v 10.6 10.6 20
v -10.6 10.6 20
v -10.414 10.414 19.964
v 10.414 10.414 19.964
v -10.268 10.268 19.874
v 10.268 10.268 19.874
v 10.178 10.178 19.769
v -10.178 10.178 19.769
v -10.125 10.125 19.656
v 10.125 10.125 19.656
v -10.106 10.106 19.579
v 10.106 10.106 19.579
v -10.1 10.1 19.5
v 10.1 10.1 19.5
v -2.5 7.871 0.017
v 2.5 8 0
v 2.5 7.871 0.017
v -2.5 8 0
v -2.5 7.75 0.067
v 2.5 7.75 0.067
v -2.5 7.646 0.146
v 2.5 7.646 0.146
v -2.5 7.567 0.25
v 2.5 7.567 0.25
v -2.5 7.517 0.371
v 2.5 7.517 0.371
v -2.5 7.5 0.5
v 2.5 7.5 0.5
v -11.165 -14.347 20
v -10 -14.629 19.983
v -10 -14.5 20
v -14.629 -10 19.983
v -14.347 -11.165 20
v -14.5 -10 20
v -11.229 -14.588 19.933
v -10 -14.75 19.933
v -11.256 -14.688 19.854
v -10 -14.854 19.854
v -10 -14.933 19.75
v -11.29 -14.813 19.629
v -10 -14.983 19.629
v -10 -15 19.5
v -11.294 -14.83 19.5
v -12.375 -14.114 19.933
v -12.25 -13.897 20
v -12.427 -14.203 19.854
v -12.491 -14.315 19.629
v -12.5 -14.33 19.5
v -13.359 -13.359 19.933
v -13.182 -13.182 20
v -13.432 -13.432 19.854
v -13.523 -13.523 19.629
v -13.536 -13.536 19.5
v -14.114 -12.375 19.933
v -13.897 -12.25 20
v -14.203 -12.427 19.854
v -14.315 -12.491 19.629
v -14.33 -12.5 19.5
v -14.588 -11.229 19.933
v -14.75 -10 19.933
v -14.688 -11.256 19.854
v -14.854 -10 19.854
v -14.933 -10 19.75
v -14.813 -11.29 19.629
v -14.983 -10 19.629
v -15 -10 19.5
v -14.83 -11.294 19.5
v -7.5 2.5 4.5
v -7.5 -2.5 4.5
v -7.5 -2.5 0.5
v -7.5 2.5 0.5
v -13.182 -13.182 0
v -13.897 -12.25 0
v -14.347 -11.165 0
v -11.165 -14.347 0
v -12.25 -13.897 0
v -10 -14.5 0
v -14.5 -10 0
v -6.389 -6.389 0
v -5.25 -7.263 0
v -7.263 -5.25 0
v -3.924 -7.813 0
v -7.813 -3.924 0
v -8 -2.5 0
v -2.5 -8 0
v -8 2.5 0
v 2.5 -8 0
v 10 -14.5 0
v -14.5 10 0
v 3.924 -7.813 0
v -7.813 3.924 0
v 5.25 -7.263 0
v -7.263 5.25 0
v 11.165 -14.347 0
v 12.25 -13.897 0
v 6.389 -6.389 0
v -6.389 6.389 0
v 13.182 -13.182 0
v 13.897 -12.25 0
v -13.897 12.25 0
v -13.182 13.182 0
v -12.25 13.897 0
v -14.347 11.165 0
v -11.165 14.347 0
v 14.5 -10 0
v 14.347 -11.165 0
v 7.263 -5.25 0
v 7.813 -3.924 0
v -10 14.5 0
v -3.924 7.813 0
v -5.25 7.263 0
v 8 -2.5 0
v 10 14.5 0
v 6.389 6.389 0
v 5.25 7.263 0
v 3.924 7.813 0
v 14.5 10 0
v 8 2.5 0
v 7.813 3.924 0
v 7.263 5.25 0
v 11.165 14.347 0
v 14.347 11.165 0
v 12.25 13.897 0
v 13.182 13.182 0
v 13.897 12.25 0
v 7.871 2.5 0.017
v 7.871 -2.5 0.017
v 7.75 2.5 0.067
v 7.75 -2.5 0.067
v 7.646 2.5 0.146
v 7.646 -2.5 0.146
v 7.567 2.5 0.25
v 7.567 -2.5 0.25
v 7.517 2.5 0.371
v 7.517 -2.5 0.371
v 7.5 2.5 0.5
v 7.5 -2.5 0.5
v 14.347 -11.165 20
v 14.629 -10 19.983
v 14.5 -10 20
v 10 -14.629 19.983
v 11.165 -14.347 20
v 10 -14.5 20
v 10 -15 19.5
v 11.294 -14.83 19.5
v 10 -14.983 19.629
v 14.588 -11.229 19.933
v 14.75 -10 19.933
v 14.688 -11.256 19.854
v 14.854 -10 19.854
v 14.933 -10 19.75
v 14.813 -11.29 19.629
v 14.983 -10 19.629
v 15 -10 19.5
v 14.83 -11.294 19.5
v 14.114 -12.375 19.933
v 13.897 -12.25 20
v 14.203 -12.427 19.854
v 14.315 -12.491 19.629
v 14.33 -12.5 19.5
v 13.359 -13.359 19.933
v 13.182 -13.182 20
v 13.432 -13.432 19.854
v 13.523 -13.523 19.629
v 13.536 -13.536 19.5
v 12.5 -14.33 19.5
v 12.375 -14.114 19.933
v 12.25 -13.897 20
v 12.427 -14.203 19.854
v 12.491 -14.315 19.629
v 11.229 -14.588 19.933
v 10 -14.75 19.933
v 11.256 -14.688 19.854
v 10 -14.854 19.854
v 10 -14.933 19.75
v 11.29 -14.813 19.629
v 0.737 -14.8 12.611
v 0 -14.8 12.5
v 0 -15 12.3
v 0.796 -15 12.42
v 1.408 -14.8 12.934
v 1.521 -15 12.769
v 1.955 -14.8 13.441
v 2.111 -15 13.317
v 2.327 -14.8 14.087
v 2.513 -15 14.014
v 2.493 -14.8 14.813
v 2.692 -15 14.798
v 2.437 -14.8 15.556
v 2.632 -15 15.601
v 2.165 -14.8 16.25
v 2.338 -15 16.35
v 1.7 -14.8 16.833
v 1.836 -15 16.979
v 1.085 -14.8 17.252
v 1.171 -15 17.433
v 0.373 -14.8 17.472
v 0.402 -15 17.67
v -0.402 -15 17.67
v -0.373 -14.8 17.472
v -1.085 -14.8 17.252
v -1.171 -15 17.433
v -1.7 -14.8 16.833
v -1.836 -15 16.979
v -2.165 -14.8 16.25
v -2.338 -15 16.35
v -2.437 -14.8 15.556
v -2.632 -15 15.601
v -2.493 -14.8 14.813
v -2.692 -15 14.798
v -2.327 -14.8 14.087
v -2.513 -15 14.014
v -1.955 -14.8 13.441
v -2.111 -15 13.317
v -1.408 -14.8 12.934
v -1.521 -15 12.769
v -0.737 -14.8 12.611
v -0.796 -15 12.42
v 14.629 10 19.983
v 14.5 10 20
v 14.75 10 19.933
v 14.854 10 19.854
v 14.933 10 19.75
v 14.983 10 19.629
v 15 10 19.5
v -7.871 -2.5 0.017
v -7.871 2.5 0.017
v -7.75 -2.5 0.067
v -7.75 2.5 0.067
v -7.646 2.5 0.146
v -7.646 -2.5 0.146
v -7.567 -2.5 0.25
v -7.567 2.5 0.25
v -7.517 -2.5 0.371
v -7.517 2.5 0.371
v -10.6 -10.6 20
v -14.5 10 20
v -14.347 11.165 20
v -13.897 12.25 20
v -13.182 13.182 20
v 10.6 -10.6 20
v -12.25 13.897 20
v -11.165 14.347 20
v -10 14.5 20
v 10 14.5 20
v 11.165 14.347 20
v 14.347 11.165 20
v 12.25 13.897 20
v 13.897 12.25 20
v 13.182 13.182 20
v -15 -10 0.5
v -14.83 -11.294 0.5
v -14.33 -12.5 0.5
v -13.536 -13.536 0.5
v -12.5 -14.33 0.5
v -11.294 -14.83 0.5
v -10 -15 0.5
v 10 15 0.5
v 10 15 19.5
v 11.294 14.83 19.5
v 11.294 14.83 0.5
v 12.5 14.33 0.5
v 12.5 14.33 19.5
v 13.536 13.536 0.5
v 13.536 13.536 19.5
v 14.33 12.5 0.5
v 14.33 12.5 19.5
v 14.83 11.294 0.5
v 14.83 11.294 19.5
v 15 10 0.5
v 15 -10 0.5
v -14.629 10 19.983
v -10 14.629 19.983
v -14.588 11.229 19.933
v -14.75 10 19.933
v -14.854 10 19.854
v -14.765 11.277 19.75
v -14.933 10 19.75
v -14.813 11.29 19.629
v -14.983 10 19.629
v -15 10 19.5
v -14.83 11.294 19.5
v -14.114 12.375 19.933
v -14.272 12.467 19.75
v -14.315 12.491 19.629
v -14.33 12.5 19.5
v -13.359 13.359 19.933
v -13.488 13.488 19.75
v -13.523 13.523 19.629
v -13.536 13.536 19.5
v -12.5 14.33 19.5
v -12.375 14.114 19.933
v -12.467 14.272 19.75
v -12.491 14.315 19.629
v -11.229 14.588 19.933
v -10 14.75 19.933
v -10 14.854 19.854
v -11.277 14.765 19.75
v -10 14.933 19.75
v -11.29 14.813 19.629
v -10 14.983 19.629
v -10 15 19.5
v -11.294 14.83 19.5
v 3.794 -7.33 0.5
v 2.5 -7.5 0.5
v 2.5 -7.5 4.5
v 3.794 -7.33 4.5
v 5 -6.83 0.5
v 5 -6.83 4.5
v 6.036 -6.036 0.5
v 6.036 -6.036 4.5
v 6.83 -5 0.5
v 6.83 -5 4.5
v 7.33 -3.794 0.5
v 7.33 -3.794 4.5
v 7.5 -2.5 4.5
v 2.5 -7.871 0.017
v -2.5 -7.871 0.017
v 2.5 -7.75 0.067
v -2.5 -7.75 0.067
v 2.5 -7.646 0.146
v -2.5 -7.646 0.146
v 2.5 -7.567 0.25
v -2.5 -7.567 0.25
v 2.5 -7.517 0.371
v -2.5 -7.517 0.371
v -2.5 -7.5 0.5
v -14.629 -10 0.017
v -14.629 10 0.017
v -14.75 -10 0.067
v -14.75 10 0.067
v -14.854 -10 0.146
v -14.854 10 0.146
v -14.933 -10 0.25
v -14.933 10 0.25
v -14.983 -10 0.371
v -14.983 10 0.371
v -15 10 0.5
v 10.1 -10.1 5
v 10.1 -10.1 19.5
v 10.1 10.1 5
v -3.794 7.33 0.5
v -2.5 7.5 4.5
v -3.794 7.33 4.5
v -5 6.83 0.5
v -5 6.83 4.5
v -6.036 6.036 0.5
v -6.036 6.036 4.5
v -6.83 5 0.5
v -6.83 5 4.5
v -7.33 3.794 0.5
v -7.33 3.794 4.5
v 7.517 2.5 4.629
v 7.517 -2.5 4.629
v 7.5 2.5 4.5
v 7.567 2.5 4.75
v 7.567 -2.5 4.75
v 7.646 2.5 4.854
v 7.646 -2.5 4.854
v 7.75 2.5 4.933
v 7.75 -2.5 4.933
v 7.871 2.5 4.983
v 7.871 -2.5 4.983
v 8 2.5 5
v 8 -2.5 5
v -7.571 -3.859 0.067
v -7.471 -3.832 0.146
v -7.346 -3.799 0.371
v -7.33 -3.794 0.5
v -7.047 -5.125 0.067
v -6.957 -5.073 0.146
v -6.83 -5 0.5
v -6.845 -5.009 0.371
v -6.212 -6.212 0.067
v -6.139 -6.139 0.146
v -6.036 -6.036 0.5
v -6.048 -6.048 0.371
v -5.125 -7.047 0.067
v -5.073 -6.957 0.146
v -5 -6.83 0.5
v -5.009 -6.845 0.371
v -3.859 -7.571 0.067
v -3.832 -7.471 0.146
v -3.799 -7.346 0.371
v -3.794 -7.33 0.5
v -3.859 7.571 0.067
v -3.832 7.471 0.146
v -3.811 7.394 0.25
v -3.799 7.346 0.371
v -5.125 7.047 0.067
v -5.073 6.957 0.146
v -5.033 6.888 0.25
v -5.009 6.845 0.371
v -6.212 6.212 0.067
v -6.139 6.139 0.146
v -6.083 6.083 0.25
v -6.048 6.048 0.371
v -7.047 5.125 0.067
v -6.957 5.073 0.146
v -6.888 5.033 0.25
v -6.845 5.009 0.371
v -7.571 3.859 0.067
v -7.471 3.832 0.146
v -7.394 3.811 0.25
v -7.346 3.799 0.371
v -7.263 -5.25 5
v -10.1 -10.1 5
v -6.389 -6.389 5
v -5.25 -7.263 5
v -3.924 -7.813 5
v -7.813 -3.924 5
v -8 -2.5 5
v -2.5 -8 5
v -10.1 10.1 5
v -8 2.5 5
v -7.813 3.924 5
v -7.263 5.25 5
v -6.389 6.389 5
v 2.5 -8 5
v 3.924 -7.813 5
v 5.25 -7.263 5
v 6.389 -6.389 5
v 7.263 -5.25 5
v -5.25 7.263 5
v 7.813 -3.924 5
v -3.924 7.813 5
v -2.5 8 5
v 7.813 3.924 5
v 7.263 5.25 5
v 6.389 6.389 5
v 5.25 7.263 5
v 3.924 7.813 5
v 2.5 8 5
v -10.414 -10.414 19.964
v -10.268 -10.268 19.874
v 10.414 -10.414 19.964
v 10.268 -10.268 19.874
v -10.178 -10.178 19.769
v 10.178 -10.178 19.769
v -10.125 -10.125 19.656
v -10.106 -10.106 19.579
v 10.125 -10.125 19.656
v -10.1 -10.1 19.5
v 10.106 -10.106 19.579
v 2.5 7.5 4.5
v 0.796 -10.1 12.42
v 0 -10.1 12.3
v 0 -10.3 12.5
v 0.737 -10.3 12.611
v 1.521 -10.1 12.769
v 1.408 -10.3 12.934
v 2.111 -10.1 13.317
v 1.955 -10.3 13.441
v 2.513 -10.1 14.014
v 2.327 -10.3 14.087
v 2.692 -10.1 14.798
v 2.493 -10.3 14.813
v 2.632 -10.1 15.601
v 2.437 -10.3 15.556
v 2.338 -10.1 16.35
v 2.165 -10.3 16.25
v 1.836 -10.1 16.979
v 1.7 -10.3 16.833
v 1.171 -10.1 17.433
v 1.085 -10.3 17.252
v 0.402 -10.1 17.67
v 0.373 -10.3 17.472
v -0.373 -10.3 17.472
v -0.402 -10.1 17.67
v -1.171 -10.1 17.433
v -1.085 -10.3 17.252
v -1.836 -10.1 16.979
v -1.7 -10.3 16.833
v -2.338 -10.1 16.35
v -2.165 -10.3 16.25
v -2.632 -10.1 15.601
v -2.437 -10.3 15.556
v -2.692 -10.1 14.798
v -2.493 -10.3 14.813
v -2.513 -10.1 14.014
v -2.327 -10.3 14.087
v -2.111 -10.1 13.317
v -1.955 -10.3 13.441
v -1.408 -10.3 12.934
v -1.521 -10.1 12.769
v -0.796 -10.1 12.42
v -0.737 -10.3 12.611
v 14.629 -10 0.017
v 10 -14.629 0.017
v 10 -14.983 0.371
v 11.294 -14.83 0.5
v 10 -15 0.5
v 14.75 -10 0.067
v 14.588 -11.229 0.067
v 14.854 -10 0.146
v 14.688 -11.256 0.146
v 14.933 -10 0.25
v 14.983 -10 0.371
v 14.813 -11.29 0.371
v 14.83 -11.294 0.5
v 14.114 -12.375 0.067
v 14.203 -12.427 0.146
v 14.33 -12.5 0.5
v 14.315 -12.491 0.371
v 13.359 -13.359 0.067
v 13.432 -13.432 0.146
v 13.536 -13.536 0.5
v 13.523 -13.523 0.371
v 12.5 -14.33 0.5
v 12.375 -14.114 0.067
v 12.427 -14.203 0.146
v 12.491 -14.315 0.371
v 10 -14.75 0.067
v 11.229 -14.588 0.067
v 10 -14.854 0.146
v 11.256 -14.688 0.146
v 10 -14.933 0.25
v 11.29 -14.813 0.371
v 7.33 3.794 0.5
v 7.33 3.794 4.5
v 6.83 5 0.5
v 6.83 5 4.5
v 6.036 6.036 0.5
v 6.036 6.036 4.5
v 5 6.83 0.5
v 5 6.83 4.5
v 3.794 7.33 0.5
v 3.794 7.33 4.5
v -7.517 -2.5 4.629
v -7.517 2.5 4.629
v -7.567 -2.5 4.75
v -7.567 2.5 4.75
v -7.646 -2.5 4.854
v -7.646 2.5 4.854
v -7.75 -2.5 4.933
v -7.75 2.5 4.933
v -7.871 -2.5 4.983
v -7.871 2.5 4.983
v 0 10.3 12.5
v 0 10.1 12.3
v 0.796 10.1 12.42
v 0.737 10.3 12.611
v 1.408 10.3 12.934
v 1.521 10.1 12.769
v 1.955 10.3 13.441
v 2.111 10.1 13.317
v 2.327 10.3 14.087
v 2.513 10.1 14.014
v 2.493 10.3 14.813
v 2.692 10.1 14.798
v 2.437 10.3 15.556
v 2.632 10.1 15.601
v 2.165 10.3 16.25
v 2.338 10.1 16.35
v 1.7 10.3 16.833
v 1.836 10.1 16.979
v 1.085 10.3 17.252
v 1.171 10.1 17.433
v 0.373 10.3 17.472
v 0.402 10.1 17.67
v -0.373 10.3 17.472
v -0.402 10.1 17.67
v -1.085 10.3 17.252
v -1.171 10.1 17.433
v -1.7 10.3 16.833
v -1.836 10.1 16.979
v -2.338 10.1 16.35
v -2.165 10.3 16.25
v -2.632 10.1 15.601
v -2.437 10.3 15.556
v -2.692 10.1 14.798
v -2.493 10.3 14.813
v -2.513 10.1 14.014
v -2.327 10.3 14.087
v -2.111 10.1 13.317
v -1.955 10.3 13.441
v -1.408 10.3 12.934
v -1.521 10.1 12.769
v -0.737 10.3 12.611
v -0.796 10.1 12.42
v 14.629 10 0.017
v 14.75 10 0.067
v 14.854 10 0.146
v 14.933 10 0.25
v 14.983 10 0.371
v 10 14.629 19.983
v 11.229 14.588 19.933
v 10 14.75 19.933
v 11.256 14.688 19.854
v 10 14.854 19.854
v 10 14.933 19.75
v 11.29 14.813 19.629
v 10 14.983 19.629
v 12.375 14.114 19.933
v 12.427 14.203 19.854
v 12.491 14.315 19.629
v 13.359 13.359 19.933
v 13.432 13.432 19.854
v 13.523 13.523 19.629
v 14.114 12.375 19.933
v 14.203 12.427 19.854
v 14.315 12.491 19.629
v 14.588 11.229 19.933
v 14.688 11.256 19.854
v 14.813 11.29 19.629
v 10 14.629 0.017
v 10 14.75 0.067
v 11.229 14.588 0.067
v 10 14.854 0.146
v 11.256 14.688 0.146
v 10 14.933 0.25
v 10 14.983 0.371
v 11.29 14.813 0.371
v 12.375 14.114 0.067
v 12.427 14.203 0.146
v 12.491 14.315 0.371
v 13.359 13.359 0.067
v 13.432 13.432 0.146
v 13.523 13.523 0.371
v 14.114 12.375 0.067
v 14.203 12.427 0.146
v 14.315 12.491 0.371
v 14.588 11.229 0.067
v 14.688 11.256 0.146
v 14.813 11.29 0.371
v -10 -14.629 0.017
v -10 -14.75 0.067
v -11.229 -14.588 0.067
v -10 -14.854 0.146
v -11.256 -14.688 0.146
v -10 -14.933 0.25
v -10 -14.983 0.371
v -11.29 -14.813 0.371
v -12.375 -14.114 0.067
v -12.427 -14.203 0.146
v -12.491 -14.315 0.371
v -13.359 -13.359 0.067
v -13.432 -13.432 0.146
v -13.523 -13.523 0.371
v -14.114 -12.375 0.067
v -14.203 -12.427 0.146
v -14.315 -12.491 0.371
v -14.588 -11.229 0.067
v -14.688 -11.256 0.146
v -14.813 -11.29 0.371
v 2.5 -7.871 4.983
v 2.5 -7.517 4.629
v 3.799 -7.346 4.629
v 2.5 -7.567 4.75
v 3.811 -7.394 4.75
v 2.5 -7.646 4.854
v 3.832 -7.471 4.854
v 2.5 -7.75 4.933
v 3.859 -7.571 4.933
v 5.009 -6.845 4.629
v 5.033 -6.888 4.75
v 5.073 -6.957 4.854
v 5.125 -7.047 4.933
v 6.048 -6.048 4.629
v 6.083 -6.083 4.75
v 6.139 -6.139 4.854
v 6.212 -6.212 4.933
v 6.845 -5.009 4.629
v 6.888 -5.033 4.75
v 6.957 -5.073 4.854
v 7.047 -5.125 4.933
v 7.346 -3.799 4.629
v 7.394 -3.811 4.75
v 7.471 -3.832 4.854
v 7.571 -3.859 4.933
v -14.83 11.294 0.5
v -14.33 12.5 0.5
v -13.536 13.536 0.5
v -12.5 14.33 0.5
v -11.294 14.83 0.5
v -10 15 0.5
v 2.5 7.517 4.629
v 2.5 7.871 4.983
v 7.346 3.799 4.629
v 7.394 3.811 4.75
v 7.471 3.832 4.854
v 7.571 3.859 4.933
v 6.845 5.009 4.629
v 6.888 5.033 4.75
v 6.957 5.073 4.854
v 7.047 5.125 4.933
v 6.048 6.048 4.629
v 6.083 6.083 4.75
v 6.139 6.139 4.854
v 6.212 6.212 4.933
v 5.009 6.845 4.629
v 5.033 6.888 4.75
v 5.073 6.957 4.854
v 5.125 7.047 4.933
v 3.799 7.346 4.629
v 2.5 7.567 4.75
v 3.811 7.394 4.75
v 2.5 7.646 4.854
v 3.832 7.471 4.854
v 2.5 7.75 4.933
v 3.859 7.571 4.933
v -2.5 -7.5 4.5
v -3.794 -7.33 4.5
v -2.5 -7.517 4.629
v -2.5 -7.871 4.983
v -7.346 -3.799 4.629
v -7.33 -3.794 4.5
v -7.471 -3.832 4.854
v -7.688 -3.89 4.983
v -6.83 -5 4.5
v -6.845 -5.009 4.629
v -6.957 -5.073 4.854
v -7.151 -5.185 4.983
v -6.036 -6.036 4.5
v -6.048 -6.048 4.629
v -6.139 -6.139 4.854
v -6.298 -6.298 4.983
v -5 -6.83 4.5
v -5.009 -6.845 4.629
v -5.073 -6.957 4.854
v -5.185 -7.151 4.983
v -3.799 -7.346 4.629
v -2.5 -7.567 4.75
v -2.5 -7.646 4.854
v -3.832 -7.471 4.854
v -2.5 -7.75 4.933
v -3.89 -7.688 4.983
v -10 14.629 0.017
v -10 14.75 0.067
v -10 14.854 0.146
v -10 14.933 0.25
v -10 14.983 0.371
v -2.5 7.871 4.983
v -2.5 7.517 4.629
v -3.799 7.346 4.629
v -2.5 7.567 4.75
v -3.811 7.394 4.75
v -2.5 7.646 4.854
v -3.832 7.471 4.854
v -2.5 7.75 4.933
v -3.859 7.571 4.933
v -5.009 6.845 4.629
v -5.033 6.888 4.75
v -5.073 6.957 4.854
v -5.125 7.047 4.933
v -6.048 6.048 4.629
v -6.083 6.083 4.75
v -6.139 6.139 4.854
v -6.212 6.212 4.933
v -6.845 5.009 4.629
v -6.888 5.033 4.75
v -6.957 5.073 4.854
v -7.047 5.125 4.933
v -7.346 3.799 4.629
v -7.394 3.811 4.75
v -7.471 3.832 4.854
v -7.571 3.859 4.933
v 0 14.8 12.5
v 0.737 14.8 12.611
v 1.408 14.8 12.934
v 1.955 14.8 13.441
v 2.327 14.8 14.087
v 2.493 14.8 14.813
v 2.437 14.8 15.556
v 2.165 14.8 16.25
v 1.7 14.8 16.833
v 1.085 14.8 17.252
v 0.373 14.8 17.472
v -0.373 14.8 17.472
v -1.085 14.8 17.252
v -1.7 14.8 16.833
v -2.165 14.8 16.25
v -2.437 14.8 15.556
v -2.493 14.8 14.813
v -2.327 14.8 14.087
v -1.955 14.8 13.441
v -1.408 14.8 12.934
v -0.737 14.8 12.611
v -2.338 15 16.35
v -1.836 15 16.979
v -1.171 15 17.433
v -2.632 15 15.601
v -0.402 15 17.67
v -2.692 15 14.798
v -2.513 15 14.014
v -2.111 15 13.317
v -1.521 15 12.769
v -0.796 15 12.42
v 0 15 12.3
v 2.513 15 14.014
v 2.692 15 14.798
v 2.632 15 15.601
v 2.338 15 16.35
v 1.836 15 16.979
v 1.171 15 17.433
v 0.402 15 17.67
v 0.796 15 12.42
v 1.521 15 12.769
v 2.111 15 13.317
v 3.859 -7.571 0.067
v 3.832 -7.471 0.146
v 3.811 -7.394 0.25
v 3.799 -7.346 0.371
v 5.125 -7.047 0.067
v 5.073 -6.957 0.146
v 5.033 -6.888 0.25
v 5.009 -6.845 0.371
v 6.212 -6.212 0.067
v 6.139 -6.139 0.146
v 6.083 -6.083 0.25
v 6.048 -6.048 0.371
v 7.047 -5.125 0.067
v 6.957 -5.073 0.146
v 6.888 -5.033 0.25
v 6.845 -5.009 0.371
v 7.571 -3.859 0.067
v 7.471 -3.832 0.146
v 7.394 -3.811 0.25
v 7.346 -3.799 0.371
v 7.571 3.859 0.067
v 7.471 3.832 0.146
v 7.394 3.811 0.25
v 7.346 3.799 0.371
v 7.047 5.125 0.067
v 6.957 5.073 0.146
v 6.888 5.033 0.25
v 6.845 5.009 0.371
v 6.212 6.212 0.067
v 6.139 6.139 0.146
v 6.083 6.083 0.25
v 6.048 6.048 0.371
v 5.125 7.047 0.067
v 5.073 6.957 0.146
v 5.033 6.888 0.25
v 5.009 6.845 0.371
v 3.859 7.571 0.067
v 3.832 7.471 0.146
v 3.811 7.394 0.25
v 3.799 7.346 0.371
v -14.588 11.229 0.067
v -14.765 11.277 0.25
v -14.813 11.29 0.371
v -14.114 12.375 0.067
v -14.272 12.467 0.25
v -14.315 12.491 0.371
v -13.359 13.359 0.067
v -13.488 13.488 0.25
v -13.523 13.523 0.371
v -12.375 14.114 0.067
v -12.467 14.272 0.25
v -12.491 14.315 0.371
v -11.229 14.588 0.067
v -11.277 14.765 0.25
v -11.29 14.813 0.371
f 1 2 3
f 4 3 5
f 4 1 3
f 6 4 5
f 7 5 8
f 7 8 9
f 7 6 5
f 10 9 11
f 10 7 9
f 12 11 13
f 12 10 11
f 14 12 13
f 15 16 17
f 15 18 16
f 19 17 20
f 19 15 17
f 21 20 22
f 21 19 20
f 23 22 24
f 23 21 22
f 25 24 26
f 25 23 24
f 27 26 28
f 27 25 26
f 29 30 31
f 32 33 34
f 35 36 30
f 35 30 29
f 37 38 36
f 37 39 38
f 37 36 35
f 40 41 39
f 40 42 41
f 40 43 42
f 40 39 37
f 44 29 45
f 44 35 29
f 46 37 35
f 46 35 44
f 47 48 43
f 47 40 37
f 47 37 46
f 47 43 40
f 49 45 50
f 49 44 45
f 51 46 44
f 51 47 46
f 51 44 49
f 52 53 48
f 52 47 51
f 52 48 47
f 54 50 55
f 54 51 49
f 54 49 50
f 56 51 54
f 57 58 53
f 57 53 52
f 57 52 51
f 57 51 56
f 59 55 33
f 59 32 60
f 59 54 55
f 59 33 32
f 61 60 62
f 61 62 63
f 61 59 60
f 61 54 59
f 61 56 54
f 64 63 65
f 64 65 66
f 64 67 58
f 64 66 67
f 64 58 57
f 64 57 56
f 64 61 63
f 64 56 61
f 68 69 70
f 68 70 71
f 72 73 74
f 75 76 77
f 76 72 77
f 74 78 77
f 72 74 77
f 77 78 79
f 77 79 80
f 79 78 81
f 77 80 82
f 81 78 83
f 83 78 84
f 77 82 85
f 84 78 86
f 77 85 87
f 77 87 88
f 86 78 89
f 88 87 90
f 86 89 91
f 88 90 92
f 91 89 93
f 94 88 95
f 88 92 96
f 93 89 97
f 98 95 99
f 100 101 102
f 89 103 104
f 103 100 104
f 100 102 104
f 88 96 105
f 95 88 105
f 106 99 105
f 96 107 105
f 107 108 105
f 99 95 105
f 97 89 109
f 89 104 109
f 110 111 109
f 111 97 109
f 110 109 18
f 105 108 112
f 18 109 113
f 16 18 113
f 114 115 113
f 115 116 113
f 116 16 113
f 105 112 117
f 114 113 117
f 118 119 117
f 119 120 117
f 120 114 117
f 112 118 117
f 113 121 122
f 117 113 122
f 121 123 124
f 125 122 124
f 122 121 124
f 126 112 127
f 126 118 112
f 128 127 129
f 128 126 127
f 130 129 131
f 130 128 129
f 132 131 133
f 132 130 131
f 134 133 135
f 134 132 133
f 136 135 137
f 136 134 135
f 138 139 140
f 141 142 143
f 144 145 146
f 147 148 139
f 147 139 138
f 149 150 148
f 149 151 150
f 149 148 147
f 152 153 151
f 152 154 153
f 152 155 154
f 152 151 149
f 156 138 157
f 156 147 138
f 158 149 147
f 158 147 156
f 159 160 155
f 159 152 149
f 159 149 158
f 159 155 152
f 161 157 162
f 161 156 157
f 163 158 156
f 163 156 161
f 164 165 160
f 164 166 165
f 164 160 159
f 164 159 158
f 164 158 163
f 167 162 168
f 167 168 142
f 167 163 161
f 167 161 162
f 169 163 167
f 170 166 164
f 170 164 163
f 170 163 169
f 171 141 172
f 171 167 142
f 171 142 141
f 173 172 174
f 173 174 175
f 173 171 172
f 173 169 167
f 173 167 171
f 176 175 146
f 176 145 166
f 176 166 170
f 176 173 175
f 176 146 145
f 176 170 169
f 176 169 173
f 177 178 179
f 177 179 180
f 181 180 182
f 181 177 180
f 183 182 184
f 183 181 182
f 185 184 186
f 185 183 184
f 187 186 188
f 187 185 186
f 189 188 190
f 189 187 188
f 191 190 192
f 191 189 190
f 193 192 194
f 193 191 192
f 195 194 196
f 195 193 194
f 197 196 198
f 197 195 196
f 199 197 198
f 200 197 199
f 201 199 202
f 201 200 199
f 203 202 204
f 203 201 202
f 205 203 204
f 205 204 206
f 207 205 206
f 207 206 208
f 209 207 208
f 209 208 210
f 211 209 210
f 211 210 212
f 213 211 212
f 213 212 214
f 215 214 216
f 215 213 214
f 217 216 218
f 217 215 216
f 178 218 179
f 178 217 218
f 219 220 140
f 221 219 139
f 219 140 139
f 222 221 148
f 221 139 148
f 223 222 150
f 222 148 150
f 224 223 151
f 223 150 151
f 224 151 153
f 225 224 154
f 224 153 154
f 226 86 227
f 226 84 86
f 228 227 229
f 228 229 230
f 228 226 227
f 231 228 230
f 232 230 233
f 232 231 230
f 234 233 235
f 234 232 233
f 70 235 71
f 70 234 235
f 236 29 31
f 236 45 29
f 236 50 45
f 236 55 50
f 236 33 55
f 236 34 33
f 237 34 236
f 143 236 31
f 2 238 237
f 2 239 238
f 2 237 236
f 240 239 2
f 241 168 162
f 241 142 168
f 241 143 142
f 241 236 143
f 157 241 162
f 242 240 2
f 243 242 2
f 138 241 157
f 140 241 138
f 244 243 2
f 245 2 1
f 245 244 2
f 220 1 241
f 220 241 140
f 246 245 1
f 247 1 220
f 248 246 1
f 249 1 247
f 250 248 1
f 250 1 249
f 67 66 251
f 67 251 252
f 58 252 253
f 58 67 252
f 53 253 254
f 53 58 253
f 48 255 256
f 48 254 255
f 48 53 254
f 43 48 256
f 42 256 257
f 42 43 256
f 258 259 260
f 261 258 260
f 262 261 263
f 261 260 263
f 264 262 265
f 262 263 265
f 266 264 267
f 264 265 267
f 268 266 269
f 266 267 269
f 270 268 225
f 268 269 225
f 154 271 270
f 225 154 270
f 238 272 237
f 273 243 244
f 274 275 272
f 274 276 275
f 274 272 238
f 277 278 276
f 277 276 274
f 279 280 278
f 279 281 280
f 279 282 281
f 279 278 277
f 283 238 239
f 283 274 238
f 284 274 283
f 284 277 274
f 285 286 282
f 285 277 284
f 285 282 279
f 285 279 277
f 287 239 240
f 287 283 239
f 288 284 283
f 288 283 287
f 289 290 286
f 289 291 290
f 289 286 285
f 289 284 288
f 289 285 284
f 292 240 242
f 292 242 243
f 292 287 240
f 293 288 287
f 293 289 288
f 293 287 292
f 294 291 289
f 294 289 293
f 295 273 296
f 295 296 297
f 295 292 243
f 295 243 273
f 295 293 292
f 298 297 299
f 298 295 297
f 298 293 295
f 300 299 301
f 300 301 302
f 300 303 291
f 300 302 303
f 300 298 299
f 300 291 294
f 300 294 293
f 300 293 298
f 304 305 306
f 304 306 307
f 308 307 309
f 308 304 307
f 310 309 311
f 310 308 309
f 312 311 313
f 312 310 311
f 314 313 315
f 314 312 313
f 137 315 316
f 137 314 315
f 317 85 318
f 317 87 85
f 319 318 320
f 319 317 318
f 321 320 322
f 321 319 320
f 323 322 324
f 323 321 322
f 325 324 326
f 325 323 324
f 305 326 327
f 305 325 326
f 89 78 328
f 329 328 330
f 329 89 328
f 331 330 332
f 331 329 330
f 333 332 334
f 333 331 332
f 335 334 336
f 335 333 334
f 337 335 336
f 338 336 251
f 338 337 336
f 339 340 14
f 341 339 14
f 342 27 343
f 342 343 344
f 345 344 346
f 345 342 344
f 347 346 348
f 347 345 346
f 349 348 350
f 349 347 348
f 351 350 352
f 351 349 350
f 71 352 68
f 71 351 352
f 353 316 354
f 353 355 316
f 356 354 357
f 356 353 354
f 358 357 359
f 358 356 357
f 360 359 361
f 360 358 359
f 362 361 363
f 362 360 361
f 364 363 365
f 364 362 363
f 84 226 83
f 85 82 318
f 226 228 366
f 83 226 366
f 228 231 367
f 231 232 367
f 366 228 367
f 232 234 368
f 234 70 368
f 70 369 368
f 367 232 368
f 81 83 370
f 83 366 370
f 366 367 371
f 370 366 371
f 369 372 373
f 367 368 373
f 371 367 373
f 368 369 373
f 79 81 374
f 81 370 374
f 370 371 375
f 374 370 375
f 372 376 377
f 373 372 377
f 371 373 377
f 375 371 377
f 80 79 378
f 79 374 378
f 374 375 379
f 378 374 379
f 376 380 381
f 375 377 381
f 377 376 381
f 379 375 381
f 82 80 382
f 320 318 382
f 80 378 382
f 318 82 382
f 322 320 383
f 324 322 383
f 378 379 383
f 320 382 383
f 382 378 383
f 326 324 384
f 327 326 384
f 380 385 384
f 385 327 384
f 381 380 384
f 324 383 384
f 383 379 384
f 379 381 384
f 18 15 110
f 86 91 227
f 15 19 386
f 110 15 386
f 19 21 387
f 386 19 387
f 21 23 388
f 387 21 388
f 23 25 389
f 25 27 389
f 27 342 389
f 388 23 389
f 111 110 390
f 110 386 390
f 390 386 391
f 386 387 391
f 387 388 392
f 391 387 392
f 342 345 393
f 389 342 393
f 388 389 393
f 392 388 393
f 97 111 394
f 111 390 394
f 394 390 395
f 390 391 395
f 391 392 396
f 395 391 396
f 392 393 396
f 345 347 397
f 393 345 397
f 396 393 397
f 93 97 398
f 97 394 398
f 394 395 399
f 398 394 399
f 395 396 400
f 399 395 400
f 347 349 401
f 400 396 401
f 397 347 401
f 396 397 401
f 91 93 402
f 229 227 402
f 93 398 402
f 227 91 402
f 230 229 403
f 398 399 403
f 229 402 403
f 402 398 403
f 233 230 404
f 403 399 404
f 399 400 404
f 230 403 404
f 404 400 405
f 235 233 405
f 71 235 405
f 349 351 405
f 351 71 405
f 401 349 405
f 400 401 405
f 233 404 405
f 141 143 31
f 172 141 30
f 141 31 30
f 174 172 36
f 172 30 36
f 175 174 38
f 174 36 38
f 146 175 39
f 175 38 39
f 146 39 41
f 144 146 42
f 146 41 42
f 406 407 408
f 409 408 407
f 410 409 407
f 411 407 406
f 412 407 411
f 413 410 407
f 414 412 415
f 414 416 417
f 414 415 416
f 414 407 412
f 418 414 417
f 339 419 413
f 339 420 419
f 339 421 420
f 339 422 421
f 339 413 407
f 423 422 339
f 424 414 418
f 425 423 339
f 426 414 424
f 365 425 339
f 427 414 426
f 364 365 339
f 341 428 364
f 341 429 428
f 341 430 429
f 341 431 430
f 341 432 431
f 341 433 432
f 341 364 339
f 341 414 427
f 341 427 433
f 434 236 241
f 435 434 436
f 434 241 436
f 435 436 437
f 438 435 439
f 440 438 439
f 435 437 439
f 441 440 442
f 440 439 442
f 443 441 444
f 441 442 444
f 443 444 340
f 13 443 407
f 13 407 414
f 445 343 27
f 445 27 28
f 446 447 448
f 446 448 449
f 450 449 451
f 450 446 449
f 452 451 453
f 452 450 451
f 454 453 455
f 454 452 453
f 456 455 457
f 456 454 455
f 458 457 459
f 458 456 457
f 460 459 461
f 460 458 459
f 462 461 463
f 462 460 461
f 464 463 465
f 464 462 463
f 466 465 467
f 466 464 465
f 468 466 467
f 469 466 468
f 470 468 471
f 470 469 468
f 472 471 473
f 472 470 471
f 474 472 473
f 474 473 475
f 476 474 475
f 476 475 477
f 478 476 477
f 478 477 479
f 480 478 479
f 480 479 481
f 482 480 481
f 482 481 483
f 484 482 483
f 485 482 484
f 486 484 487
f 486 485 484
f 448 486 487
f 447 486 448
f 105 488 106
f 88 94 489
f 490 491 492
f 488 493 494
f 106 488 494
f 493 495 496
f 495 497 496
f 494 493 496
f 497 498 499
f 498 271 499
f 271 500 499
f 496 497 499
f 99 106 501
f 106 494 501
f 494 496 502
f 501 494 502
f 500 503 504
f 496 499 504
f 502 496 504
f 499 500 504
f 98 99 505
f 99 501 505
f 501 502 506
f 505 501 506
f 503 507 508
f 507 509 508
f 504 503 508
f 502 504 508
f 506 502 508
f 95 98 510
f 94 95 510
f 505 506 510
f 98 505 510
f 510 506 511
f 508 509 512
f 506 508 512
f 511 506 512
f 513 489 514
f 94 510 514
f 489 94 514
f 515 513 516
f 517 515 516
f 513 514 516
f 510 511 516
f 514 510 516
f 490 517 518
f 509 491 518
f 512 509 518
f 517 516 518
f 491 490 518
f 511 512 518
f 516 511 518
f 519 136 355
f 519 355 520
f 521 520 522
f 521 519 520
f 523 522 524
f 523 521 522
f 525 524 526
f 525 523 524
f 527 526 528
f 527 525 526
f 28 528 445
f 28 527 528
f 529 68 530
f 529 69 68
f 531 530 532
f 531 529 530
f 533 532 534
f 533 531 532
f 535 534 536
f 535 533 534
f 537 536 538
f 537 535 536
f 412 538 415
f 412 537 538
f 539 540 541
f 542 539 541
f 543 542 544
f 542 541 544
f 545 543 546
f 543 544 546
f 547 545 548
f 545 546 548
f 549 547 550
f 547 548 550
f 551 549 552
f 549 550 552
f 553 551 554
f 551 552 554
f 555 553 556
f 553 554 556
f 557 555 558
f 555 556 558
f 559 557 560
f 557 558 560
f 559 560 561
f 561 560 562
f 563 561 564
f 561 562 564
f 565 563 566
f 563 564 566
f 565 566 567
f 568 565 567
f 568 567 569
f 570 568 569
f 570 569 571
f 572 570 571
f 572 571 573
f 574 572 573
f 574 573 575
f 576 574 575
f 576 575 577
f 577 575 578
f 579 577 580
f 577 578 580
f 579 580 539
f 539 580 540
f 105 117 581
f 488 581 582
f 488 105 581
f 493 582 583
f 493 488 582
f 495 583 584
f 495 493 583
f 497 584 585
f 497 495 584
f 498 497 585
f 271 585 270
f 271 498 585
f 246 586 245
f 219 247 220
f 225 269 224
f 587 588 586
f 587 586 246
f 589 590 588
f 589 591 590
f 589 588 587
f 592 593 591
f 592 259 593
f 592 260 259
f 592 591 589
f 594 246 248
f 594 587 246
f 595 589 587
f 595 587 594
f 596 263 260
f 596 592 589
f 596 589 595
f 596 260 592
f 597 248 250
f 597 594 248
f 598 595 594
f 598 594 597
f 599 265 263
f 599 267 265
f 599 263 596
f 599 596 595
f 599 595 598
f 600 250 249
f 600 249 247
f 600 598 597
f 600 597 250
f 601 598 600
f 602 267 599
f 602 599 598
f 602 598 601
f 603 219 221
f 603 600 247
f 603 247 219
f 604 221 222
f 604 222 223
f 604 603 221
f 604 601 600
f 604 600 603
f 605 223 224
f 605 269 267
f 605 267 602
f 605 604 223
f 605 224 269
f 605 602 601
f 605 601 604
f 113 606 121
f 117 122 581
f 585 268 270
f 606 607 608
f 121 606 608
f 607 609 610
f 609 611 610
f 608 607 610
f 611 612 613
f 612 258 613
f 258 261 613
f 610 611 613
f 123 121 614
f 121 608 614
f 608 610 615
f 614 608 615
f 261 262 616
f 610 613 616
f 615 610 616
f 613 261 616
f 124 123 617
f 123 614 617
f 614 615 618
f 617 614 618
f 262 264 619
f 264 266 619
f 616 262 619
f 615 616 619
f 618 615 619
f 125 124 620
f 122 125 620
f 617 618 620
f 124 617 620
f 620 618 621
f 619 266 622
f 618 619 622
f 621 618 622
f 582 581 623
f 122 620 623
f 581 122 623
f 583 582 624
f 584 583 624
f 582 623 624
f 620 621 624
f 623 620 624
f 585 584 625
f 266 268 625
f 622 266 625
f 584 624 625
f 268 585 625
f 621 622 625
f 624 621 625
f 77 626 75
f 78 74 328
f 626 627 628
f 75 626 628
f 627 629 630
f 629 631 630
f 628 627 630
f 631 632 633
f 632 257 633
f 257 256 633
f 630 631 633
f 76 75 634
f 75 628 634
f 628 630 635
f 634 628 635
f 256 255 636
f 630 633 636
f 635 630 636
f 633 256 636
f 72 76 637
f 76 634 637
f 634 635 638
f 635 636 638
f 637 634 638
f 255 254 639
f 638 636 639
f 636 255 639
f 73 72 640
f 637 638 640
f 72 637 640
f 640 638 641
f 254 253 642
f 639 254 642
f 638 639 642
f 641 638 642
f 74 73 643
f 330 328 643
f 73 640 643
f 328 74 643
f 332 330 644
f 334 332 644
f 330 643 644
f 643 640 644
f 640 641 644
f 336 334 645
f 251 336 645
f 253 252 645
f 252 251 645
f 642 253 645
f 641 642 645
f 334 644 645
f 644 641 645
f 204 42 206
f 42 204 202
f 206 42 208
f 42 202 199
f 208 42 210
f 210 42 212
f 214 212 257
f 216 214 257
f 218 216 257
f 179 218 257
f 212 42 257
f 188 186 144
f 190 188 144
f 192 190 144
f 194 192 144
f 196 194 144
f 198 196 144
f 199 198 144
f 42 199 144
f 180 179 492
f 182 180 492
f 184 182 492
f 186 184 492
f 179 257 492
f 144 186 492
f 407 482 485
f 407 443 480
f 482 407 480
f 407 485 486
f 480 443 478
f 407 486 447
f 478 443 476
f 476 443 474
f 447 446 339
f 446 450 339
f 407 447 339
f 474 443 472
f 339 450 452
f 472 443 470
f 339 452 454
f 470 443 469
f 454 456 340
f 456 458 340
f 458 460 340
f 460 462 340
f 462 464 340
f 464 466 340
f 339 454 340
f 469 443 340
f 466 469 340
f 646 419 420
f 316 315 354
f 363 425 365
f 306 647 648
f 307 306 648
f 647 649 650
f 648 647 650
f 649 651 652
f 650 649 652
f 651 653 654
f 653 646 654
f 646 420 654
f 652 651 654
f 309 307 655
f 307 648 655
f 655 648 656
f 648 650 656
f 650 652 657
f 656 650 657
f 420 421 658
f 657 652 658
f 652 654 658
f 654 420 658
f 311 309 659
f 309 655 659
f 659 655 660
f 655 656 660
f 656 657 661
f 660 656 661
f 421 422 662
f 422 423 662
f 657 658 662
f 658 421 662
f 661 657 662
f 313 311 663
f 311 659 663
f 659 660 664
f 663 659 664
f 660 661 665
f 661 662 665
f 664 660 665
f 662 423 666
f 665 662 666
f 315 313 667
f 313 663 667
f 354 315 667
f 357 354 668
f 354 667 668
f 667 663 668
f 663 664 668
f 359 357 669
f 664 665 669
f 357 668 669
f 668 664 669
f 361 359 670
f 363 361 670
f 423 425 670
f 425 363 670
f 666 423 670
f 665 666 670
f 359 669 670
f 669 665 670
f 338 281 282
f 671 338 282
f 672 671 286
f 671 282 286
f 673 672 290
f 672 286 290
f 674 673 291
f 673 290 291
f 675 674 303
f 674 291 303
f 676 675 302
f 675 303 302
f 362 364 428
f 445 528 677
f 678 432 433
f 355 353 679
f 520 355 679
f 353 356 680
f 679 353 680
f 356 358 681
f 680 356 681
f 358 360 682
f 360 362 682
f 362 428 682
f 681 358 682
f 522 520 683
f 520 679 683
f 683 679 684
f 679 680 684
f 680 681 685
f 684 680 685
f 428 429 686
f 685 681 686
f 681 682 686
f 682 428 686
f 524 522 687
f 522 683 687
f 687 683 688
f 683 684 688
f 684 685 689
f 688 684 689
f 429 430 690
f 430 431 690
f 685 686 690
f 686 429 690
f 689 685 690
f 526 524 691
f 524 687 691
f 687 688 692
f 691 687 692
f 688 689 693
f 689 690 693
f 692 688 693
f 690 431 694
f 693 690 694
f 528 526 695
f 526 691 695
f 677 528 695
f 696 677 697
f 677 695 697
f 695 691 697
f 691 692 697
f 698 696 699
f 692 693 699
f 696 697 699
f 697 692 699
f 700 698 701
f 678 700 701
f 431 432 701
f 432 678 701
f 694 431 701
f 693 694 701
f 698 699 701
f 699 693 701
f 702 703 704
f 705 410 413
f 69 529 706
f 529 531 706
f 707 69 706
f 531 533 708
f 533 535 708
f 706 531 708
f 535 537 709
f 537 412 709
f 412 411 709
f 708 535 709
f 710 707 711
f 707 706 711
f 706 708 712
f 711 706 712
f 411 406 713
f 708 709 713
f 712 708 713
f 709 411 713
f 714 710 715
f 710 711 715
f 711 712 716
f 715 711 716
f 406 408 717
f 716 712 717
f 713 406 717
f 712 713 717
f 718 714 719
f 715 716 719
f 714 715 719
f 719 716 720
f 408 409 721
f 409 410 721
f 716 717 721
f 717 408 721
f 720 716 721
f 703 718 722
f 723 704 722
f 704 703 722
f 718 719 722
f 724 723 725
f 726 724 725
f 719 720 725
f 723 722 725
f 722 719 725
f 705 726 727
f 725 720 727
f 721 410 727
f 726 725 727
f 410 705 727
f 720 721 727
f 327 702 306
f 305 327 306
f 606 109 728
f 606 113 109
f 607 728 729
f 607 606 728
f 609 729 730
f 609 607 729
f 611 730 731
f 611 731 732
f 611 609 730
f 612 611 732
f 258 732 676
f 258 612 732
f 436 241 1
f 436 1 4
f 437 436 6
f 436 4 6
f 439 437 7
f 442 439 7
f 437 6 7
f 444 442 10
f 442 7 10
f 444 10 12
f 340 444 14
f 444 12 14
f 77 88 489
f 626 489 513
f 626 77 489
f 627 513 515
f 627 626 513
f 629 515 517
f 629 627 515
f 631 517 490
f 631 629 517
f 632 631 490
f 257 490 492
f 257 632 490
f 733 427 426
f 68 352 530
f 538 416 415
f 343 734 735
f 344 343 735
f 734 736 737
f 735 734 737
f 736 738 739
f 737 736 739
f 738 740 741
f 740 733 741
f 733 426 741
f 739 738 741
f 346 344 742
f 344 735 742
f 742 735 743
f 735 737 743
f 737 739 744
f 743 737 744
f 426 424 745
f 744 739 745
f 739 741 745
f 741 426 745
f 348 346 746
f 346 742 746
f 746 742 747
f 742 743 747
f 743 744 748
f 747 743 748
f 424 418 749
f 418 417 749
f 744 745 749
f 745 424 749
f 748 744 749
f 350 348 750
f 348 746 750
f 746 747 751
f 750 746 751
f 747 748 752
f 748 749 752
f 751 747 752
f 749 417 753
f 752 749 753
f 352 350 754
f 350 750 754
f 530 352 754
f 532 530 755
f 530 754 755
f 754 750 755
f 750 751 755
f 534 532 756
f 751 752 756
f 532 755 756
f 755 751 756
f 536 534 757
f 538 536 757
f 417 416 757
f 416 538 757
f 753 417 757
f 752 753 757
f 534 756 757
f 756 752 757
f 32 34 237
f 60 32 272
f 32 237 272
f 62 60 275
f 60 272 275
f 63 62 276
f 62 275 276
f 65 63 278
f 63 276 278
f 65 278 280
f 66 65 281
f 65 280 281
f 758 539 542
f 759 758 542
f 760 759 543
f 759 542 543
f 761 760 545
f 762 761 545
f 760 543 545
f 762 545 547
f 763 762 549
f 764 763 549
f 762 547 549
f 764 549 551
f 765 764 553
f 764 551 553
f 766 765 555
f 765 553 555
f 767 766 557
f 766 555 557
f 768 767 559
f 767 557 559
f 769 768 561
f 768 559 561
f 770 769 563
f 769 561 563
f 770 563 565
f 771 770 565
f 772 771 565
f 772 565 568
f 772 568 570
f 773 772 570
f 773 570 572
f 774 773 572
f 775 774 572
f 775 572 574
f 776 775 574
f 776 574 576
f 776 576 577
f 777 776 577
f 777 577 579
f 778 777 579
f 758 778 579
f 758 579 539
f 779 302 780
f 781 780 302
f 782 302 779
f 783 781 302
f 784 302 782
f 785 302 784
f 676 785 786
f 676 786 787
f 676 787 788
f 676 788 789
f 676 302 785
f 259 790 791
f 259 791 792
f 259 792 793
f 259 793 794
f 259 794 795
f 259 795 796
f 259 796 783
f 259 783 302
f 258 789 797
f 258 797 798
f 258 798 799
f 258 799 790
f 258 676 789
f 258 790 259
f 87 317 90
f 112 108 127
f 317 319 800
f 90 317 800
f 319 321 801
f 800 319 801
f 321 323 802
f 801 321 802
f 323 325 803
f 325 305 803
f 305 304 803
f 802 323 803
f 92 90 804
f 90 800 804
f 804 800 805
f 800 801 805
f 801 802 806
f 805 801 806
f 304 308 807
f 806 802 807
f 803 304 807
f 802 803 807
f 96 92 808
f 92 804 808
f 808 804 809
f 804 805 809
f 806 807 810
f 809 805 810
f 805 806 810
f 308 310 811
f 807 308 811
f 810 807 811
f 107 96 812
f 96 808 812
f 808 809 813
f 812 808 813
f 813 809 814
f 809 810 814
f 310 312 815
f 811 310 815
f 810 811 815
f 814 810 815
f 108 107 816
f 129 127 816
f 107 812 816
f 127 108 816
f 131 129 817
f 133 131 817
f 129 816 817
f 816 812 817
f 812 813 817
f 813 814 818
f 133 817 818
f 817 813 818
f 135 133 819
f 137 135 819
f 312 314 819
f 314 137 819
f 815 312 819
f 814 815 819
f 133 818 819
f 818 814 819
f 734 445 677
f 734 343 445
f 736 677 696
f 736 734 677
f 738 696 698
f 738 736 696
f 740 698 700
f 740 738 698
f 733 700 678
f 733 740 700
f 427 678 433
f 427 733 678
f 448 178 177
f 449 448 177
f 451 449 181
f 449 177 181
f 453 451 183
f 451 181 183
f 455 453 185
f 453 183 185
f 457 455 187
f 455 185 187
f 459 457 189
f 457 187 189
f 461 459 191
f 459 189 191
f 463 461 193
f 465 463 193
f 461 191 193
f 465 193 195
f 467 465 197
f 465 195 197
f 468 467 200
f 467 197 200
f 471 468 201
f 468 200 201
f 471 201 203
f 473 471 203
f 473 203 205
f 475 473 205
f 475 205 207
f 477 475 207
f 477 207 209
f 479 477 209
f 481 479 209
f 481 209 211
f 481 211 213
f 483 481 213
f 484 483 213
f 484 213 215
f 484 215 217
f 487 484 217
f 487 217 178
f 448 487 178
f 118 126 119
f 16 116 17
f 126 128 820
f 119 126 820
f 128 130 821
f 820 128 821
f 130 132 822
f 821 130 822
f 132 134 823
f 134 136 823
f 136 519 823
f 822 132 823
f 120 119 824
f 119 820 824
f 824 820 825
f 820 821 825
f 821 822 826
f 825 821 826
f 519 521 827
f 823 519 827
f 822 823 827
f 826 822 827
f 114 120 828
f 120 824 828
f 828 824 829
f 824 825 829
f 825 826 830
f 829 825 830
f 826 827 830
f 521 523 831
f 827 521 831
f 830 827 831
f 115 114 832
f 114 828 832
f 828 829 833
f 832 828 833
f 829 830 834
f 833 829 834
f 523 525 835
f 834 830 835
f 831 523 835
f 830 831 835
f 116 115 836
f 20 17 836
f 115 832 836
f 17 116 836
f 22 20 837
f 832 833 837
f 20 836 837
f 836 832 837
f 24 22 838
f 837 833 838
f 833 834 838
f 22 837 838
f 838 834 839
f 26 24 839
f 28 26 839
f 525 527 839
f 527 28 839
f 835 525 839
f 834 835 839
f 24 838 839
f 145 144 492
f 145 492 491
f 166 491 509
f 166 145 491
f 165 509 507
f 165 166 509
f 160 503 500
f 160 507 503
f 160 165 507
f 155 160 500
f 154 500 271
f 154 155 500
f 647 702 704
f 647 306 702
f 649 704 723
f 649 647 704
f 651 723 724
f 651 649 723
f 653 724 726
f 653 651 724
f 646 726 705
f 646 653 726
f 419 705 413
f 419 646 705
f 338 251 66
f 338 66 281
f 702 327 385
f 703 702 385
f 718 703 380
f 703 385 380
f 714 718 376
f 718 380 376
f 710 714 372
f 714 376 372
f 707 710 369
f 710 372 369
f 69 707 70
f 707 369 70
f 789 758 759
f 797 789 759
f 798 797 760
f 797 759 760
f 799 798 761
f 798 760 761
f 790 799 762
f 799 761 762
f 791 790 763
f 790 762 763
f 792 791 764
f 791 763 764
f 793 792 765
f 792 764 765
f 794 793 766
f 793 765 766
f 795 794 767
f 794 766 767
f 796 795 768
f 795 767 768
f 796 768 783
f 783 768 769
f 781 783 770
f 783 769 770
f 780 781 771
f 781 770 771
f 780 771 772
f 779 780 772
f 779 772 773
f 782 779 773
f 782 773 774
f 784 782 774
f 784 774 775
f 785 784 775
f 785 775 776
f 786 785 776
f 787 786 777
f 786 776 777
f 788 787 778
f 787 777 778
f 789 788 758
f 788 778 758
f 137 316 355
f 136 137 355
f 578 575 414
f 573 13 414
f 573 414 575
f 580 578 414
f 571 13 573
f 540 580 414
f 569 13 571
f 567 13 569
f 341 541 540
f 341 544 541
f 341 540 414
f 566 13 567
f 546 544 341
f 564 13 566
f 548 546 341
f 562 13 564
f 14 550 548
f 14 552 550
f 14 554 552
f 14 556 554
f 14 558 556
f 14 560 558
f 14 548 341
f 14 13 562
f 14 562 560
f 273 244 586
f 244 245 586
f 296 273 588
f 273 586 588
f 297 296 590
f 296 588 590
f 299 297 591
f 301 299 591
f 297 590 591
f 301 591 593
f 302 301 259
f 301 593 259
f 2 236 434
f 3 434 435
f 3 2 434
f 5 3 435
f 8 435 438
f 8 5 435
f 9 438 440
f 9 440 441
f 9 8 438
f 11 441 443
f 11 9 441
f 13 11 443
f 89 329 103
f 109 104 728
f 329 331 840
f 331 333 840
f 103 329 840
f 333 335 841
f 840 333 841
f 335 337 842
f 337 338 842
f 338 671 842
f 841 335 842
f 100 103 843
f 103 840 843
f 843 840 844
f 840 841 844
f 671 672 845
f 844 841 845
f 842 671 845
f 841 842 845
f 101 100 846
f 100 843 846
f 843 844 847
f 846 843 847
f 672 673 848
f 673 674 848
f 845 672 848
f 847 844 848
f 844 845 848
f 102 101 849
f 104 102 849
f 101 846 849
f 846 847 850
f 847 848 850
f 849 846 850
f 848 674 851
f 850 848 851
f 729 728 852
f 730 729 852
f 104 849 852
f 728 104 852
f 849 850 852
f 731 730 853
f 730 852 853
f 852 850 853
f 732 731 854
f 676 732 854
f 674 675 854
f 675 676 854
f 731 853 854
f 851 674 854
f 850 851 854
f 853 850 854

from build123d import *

# Parameters (mm, degrees)
SKETCH1_W           = 30
SKETCH1_H           = 30
BOSS_EXTRUDE1_DEPTH = 20
SKETCH2_W           = 20.2
SKETCH2_H           = 20.2
CUT_EXTRUDE1_DEPTH  = 15
SKETCH3_R           = 2.5
CUT_EXTRUDE2_DEPTH  = 40.05124838
SKETCH4_W           = 15
SKETCH4_H           = 15
CUT_EXTRUDE3_DEPTH  = 26.980762114
FILLET2_R           = 5
FILLET1_R           = 0.5
CHAMFER1_SIZE       = 0.2


with BuildPart() as part:
    # Sketch1 → Boss-Extrude1 (new body)
    with BuildSketch(Plane.XY):
        Rectangle(SKETCH1_W, SKETCH1_H)
    extrude(amount=BOSS_EXTRUDE1_DEPTH)

    # Sketch2 → Cut-Extrude1 (cut)
    with BuildSketch(Plane.XY.offset(20)):
        Rectangle(SKETCH2_W, SKETCH2_H)
    extrude(amount=-CUT_EXTRUDE1_DEPTH, mode=Mode.SUBTRACT)

    # Sketch3 → Cut-Extrude2 (cut, through all)
    with BuildSketch(Plane.XZ.offset(15)):
        with Locations(Location((0, 15, 0), (0, 0, 270))):
            Circle(SKETCH3_R)
    extrude(amount=-CUT_EXTRUDE2_DEPTH, mode=Mode.SUBTRACT)

    # Sketch4 → Cut-Extrude3 (cut, through all)
    with BuildSketch(Plane.XY.offset(5)):
        Rectangle(SKETCH4_W, SKETCH4_H)
    extrude(amount=-CUT_EXTRUDE3_DEPTH, mode=Mode.SUBTRACT)

    # Fillet2
    fillet2_edges = [part.edges().sort_by_distance(p)[0] for p in [
        (7.5, 7.5, 2.5),
        (7.5, -7.5, 2.5),
        (-7.5, -7.5, 2.5),
        (-7.5, 7.5, 2.5),
        (15, -15, 10),
        (-15, -15, 10),
        (-15, 15, 10),
        (15, 15, 10),
    ]]
    fillet(fillet2_edges, radius=FILLET2_R)

    # Fillet1
    fillet1_edges = [part.edges().sort_by_distance(p)[0] for p in [
        (10.1, 0, 20),
        (0, 10.1, 20),
        (-10.1, 0, 20),
        (0, -10.1, 20),
        (0, -7.5, 5),
        (0, -7.5, 0),
        (-7.5, 0, 5),
        (-7.5, 0, 0),
        (7.5, 0, 5),
        (7.5, 0, 0),
        (0, 7.5, 5),
        (0, 7.5, 0),
        (0, 15, 0),
        (0, 15, 20),
        (15, 0, 0),
        (0, -15, 0),
        (-15, 0, 0),
        (13.535533906, -13.535533906, 0),
        (-13.535533906, -13.535533906, 0),
        (-13.535533906, 13.535533906, 0),
        (13.535533906, 13.535533906, 0),
        (15, 0, 20),
        (-15, 0, 20),
        (0, -15, 20),
        (13.535533906, -13.535533906, 20),
        (-13.535533906, -13.535533906, 20),
        (-13.535533906, 13.535533906, 20),
        (13.535533906, 13.535533906, 20),
        (-6.035533906, -6.035533906, 5),
        (-6.035533906, -6.035533906, 0),
        (6.035533906, -6.035533906, 5),
        (6.035533906, -6.035533906, 0),
        (6.035533906, 6.035533906, 5),
        (6.035533906, 6.035533906, 0),
        (-6.035533906, 6.035533906, 5),
        (-6.035533906, 6.035533906, 0),
    ]]
    fillet(fillet1_edges, radius=FILLET1_R)

    # Chamfer1
    chamfer1_edges = [part.edges().sort_by_distance(p)[0] for p in [
        (0, 15, 17.5),
        (0, 10.1, 17.5),
        (0, -10.1, 17.5),
        (0, -15, 17.5),
    ]]
    chamfer(chamfer1_edges, length=CHAMFER1_SIZE)


solid = part.part
